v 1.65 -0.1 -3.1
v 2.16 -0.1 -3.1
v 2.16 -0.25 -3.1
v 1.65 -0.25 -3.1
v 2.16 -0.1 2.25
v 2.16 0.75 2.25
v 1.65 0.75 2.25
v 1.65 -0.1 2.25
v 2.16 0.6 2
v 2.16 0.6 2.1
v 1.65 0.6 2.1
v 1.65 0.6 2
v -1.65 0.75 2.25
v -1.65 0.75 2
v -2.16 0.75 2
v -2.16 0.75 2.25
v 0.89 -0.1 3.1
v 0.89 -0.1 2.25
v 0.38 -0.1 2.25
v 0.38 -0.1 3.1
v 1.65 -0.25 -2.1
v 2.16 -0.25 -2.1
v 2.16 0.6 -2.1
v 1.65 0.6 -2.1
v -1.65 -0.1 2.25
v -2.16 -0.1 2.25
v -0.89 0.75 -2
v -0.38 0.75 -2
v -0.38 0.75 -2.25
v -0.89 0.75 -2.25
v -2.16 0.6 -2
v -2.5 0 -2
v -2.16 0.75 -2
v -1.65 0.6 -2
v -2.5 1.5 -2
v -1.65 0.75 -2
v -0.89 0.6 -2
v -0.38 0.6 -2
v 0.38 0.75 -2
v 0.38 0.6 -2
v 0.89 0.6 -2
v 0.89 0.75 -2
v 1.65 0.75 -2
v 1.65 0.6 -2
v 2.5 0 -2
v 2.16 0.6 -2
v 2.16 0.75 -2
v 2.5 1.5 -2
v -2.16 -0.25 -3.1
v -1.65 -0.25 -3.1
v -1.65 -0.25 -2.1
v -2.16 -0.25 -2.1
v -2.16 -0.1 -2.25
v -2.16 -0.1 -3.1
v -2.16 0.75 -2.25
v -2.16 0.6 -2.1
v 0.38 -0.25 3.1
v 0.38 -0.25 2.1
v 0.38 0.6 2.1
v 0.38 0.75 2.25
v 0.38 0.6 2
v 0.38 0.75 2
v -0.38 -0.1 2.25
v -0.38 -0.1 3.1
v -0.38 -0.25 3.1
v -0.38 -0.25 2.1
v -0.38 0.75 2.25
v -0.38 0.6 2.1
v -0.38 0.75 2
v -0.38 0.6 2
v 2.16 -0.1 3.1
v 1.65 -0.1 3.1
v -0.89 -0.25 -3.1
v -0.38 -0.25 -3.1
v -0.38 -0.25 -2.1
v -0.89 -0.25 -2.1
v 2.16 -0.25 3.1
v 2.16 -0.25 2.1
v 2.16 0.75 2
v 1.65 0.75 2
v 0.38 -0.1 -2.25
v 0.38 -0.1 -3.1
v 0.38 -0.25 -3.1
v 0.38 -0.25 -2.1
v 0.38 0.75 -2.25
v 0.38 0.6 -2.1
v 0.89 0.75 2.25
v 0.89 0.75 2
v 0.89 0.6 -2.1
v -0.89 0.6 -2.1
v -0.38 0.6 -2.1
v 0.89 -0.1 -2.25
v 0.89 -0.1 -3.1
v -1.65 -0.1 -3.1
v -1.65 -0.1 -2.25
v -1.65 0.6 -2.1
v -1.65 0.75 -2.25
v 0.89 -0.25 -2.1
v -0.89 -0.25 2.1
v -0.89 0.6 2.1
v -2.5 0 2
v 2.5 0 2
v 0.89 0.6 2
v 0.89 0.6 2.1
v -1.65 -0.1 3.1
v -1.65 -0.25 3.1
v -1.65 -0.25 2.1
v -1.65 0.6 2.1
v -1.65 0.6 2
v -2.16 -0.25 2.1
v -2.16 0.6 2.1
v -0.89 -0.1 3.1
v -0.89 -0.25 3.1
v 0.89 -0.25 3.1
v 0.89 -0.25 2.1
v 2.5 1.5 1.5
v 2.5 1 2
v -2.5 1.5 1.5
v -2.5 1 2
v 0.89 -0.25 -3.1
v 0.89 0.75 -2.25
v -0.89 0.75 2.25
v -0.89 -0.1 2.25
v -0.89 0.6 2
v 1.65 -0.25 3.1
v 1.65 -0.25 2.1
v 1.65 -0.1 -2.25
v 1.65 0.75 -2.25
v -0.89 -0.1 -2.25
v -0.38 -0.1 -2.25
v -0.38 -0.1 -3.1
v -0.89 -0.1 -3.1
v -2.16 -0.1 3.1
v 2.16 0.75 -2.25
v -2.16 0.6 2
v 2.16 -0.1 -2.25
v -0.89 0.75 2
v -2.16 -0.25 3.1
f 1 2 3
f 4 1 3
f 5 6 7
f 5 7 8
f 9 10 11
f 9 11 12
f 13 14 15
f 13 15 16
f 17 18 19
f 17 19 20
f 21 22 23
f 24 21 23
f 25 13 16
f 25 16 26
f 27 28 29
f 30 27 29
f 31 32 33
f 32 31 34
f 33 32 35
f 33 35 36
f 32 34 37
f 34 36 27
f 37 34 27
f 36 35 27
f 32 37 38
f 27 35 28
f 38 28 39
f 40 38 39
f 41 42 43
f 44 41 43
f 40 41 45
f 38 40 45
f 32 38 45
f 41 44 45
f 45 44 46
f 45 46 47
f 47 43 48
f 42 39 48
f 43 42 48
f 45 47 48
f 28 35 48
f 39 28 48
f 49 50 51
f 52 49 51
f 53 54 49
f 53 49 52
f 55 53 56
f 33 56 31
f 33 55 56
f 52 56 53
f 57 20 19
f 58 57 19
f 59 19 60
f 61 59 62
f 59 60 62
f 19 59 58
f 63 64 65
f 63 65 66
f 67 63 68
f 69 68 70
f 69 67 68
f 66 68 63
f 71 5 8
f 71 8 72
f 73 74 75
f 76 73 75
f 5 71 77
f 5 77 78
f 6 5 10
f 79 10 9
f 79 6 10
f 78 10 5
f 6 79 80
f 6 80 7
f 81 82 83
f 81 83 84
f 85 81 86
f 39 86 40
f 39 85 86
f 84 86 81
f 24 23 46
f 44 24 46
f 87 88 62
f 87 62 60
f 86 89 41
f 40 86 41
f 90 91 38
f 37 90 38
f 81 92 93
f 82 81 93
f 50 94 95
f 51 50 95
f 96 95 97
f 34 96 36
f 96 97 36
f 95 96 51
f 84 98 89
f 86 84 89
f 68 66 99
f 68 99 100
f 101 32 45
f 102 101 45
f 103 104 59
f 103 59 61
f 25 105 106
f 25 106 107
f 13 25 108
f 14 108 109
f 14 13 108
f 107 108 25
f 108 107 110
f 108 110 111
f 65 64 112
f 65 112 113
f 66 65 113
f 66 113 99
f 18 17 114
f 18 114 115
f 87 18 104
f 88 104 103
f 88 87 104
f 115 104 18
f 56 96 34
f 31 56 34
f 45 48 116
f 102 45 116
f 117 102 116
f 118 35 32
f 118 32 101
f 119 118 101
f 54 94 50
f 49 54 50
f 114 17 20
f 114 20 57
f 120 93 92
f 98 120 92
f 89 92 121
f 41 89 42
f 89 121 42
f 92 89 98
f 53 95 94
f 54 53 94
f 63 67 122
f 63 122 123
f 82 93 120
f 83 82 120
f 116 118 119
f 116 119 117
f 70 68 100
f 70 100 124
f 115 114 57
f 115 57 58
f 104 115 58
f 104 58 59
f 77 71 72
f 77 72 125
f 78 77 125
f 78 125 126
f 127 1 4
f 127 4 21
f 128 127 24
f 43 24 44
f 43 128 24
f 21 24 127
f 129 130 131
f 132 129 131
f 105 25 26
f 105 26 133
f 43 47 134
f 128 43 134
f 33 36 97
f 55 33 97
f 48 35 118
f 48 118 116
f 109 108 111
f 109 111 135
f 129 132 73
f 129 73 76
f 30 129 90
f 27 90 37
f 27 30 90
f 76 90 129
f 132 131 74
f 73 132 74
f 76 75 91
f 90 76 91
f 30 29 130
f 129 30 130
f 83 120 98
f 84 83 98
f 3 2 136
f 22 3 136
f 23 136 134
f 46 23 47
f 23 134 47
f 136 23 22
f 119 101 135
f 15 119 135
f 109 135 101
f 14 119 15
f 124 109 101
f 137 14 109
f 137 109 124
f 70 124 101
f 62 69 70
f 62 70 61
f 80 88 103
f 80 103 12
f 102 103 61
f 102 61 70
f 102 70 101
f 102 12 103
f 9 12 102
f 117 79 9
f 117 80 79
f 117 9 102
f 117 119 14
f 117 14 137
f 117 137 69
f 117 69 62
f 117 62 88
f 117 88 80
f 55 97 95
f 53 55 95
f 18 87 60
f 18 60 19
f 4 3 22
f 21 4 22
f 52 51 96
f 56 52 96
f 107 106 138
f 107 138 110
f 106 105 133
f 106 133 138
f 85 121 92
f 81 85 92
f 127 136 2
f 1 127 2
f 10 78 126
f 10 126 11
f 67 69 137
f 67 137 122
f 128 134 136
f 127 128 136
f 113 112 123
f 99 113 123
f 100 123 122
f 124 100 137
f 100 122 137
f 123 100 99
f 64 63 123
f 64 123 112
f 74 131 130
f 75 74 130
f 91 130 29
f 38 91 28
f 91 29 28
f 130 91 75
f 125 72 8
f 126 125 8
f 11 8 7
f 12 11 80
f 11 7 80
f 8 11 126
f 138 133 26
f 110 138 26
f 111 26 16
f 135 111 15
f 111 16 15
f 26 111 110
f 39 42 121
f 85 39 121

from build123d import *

# Parameters (mm, degrees)
SKETCH_1_W          = 5
SKETCH_1_H          = 4
EXTRUDE_1_DEPTH     = 1.5
CHAMFER_1_SIZE      = 0.5
EXTRUDE_2_DEPTH     = 5
SKETCH_3_W          = 0.34
SKETCH_3_H          = 1.1
SKETCH_3_W_2        = 0.76
CUT_EXTRUDE_1_DEPTH = 5.35


with BuildPart() as part:
    # Эскиз1 → Бобышка-Вытянуть1 (new body)
    with BuildSketch(Plane(origin=(0, 0, 0), x_dir=(1, 0, 0), z_dir=(0, 1, 0))):
        Rectangle(SKETCH_1_W, SKETCH_1_H)
    extrude(amount=EXTRUDE_1_DEPTH)

    # Фаска1
    chamfer_1_edges = [part.edges().sort_by_distance(p)[0] for p in [
        (0, 1.5, 2),
    ]]
    chamfer(chamfer_1_edges, length=CHAMFER_1_SIZE)

    # Эскиз2 → Бобышка-Вытянуть2 (add, through all)
    with BuildSketch(Plane(origin=(2.5, 0, 0), x_dir=(0, 0, -1), z_dir=(1, 0, 0))):
        Polygon((-2, 0.75), (-2.25, 0.75), (-2.25, -0.1), (-3.1, -0.1), (-3.1, -0.25), (-2.1, -0.25), (-2.1, 0.6), (0, 0.6), (0, 0.75), align=None)
    extrude_2 = extrude(amount=-EXTRUDE_2_DEPTH)

    # Эскиз3 → Вырез-Вытянуть1 (cut, through all)
    with BuildSketch(Plane(origin=(0, 1.5, 0), x_dir=(1, 0, 0), z_dir=(0, 1, 0))):
        with Locations((-2.33, -2.55)):
            Rectangle(SKETCH_3_W, SKETCH_3_H)
        with Locations((-1.27, -2.55)):
            Rectangle(SKETCH_3_W_2, SKETCH_3_H)
        with Locations((0, -2.55)):
            Rectangle(SKETCH_3_W_2, SKETCH_3_H)
        with Locations((1.27, -2.55)):
            Rectangle(SKETCH_3_W_2, SKETCH_3_H)
        with Locations((2.33, -2.55)):
            Rectangle(SKETCH_3_W, SKETCH_3_H)
    cut_extrude_1 = extrude(amount=-CUT_EXTRUDE_1_DEPTH, mode=Mode.SUBTRACT)

    # Зеркальное отражение1: Бобышка-Вытянуть2, Вырез-Вытянуть1 across plane
    add(extrude_2.mirror(Plane.XY))
    add(cut_extrude_1.mirror(Plane.XY), mode=Mode.SUBTRACT)


solid = part.part
